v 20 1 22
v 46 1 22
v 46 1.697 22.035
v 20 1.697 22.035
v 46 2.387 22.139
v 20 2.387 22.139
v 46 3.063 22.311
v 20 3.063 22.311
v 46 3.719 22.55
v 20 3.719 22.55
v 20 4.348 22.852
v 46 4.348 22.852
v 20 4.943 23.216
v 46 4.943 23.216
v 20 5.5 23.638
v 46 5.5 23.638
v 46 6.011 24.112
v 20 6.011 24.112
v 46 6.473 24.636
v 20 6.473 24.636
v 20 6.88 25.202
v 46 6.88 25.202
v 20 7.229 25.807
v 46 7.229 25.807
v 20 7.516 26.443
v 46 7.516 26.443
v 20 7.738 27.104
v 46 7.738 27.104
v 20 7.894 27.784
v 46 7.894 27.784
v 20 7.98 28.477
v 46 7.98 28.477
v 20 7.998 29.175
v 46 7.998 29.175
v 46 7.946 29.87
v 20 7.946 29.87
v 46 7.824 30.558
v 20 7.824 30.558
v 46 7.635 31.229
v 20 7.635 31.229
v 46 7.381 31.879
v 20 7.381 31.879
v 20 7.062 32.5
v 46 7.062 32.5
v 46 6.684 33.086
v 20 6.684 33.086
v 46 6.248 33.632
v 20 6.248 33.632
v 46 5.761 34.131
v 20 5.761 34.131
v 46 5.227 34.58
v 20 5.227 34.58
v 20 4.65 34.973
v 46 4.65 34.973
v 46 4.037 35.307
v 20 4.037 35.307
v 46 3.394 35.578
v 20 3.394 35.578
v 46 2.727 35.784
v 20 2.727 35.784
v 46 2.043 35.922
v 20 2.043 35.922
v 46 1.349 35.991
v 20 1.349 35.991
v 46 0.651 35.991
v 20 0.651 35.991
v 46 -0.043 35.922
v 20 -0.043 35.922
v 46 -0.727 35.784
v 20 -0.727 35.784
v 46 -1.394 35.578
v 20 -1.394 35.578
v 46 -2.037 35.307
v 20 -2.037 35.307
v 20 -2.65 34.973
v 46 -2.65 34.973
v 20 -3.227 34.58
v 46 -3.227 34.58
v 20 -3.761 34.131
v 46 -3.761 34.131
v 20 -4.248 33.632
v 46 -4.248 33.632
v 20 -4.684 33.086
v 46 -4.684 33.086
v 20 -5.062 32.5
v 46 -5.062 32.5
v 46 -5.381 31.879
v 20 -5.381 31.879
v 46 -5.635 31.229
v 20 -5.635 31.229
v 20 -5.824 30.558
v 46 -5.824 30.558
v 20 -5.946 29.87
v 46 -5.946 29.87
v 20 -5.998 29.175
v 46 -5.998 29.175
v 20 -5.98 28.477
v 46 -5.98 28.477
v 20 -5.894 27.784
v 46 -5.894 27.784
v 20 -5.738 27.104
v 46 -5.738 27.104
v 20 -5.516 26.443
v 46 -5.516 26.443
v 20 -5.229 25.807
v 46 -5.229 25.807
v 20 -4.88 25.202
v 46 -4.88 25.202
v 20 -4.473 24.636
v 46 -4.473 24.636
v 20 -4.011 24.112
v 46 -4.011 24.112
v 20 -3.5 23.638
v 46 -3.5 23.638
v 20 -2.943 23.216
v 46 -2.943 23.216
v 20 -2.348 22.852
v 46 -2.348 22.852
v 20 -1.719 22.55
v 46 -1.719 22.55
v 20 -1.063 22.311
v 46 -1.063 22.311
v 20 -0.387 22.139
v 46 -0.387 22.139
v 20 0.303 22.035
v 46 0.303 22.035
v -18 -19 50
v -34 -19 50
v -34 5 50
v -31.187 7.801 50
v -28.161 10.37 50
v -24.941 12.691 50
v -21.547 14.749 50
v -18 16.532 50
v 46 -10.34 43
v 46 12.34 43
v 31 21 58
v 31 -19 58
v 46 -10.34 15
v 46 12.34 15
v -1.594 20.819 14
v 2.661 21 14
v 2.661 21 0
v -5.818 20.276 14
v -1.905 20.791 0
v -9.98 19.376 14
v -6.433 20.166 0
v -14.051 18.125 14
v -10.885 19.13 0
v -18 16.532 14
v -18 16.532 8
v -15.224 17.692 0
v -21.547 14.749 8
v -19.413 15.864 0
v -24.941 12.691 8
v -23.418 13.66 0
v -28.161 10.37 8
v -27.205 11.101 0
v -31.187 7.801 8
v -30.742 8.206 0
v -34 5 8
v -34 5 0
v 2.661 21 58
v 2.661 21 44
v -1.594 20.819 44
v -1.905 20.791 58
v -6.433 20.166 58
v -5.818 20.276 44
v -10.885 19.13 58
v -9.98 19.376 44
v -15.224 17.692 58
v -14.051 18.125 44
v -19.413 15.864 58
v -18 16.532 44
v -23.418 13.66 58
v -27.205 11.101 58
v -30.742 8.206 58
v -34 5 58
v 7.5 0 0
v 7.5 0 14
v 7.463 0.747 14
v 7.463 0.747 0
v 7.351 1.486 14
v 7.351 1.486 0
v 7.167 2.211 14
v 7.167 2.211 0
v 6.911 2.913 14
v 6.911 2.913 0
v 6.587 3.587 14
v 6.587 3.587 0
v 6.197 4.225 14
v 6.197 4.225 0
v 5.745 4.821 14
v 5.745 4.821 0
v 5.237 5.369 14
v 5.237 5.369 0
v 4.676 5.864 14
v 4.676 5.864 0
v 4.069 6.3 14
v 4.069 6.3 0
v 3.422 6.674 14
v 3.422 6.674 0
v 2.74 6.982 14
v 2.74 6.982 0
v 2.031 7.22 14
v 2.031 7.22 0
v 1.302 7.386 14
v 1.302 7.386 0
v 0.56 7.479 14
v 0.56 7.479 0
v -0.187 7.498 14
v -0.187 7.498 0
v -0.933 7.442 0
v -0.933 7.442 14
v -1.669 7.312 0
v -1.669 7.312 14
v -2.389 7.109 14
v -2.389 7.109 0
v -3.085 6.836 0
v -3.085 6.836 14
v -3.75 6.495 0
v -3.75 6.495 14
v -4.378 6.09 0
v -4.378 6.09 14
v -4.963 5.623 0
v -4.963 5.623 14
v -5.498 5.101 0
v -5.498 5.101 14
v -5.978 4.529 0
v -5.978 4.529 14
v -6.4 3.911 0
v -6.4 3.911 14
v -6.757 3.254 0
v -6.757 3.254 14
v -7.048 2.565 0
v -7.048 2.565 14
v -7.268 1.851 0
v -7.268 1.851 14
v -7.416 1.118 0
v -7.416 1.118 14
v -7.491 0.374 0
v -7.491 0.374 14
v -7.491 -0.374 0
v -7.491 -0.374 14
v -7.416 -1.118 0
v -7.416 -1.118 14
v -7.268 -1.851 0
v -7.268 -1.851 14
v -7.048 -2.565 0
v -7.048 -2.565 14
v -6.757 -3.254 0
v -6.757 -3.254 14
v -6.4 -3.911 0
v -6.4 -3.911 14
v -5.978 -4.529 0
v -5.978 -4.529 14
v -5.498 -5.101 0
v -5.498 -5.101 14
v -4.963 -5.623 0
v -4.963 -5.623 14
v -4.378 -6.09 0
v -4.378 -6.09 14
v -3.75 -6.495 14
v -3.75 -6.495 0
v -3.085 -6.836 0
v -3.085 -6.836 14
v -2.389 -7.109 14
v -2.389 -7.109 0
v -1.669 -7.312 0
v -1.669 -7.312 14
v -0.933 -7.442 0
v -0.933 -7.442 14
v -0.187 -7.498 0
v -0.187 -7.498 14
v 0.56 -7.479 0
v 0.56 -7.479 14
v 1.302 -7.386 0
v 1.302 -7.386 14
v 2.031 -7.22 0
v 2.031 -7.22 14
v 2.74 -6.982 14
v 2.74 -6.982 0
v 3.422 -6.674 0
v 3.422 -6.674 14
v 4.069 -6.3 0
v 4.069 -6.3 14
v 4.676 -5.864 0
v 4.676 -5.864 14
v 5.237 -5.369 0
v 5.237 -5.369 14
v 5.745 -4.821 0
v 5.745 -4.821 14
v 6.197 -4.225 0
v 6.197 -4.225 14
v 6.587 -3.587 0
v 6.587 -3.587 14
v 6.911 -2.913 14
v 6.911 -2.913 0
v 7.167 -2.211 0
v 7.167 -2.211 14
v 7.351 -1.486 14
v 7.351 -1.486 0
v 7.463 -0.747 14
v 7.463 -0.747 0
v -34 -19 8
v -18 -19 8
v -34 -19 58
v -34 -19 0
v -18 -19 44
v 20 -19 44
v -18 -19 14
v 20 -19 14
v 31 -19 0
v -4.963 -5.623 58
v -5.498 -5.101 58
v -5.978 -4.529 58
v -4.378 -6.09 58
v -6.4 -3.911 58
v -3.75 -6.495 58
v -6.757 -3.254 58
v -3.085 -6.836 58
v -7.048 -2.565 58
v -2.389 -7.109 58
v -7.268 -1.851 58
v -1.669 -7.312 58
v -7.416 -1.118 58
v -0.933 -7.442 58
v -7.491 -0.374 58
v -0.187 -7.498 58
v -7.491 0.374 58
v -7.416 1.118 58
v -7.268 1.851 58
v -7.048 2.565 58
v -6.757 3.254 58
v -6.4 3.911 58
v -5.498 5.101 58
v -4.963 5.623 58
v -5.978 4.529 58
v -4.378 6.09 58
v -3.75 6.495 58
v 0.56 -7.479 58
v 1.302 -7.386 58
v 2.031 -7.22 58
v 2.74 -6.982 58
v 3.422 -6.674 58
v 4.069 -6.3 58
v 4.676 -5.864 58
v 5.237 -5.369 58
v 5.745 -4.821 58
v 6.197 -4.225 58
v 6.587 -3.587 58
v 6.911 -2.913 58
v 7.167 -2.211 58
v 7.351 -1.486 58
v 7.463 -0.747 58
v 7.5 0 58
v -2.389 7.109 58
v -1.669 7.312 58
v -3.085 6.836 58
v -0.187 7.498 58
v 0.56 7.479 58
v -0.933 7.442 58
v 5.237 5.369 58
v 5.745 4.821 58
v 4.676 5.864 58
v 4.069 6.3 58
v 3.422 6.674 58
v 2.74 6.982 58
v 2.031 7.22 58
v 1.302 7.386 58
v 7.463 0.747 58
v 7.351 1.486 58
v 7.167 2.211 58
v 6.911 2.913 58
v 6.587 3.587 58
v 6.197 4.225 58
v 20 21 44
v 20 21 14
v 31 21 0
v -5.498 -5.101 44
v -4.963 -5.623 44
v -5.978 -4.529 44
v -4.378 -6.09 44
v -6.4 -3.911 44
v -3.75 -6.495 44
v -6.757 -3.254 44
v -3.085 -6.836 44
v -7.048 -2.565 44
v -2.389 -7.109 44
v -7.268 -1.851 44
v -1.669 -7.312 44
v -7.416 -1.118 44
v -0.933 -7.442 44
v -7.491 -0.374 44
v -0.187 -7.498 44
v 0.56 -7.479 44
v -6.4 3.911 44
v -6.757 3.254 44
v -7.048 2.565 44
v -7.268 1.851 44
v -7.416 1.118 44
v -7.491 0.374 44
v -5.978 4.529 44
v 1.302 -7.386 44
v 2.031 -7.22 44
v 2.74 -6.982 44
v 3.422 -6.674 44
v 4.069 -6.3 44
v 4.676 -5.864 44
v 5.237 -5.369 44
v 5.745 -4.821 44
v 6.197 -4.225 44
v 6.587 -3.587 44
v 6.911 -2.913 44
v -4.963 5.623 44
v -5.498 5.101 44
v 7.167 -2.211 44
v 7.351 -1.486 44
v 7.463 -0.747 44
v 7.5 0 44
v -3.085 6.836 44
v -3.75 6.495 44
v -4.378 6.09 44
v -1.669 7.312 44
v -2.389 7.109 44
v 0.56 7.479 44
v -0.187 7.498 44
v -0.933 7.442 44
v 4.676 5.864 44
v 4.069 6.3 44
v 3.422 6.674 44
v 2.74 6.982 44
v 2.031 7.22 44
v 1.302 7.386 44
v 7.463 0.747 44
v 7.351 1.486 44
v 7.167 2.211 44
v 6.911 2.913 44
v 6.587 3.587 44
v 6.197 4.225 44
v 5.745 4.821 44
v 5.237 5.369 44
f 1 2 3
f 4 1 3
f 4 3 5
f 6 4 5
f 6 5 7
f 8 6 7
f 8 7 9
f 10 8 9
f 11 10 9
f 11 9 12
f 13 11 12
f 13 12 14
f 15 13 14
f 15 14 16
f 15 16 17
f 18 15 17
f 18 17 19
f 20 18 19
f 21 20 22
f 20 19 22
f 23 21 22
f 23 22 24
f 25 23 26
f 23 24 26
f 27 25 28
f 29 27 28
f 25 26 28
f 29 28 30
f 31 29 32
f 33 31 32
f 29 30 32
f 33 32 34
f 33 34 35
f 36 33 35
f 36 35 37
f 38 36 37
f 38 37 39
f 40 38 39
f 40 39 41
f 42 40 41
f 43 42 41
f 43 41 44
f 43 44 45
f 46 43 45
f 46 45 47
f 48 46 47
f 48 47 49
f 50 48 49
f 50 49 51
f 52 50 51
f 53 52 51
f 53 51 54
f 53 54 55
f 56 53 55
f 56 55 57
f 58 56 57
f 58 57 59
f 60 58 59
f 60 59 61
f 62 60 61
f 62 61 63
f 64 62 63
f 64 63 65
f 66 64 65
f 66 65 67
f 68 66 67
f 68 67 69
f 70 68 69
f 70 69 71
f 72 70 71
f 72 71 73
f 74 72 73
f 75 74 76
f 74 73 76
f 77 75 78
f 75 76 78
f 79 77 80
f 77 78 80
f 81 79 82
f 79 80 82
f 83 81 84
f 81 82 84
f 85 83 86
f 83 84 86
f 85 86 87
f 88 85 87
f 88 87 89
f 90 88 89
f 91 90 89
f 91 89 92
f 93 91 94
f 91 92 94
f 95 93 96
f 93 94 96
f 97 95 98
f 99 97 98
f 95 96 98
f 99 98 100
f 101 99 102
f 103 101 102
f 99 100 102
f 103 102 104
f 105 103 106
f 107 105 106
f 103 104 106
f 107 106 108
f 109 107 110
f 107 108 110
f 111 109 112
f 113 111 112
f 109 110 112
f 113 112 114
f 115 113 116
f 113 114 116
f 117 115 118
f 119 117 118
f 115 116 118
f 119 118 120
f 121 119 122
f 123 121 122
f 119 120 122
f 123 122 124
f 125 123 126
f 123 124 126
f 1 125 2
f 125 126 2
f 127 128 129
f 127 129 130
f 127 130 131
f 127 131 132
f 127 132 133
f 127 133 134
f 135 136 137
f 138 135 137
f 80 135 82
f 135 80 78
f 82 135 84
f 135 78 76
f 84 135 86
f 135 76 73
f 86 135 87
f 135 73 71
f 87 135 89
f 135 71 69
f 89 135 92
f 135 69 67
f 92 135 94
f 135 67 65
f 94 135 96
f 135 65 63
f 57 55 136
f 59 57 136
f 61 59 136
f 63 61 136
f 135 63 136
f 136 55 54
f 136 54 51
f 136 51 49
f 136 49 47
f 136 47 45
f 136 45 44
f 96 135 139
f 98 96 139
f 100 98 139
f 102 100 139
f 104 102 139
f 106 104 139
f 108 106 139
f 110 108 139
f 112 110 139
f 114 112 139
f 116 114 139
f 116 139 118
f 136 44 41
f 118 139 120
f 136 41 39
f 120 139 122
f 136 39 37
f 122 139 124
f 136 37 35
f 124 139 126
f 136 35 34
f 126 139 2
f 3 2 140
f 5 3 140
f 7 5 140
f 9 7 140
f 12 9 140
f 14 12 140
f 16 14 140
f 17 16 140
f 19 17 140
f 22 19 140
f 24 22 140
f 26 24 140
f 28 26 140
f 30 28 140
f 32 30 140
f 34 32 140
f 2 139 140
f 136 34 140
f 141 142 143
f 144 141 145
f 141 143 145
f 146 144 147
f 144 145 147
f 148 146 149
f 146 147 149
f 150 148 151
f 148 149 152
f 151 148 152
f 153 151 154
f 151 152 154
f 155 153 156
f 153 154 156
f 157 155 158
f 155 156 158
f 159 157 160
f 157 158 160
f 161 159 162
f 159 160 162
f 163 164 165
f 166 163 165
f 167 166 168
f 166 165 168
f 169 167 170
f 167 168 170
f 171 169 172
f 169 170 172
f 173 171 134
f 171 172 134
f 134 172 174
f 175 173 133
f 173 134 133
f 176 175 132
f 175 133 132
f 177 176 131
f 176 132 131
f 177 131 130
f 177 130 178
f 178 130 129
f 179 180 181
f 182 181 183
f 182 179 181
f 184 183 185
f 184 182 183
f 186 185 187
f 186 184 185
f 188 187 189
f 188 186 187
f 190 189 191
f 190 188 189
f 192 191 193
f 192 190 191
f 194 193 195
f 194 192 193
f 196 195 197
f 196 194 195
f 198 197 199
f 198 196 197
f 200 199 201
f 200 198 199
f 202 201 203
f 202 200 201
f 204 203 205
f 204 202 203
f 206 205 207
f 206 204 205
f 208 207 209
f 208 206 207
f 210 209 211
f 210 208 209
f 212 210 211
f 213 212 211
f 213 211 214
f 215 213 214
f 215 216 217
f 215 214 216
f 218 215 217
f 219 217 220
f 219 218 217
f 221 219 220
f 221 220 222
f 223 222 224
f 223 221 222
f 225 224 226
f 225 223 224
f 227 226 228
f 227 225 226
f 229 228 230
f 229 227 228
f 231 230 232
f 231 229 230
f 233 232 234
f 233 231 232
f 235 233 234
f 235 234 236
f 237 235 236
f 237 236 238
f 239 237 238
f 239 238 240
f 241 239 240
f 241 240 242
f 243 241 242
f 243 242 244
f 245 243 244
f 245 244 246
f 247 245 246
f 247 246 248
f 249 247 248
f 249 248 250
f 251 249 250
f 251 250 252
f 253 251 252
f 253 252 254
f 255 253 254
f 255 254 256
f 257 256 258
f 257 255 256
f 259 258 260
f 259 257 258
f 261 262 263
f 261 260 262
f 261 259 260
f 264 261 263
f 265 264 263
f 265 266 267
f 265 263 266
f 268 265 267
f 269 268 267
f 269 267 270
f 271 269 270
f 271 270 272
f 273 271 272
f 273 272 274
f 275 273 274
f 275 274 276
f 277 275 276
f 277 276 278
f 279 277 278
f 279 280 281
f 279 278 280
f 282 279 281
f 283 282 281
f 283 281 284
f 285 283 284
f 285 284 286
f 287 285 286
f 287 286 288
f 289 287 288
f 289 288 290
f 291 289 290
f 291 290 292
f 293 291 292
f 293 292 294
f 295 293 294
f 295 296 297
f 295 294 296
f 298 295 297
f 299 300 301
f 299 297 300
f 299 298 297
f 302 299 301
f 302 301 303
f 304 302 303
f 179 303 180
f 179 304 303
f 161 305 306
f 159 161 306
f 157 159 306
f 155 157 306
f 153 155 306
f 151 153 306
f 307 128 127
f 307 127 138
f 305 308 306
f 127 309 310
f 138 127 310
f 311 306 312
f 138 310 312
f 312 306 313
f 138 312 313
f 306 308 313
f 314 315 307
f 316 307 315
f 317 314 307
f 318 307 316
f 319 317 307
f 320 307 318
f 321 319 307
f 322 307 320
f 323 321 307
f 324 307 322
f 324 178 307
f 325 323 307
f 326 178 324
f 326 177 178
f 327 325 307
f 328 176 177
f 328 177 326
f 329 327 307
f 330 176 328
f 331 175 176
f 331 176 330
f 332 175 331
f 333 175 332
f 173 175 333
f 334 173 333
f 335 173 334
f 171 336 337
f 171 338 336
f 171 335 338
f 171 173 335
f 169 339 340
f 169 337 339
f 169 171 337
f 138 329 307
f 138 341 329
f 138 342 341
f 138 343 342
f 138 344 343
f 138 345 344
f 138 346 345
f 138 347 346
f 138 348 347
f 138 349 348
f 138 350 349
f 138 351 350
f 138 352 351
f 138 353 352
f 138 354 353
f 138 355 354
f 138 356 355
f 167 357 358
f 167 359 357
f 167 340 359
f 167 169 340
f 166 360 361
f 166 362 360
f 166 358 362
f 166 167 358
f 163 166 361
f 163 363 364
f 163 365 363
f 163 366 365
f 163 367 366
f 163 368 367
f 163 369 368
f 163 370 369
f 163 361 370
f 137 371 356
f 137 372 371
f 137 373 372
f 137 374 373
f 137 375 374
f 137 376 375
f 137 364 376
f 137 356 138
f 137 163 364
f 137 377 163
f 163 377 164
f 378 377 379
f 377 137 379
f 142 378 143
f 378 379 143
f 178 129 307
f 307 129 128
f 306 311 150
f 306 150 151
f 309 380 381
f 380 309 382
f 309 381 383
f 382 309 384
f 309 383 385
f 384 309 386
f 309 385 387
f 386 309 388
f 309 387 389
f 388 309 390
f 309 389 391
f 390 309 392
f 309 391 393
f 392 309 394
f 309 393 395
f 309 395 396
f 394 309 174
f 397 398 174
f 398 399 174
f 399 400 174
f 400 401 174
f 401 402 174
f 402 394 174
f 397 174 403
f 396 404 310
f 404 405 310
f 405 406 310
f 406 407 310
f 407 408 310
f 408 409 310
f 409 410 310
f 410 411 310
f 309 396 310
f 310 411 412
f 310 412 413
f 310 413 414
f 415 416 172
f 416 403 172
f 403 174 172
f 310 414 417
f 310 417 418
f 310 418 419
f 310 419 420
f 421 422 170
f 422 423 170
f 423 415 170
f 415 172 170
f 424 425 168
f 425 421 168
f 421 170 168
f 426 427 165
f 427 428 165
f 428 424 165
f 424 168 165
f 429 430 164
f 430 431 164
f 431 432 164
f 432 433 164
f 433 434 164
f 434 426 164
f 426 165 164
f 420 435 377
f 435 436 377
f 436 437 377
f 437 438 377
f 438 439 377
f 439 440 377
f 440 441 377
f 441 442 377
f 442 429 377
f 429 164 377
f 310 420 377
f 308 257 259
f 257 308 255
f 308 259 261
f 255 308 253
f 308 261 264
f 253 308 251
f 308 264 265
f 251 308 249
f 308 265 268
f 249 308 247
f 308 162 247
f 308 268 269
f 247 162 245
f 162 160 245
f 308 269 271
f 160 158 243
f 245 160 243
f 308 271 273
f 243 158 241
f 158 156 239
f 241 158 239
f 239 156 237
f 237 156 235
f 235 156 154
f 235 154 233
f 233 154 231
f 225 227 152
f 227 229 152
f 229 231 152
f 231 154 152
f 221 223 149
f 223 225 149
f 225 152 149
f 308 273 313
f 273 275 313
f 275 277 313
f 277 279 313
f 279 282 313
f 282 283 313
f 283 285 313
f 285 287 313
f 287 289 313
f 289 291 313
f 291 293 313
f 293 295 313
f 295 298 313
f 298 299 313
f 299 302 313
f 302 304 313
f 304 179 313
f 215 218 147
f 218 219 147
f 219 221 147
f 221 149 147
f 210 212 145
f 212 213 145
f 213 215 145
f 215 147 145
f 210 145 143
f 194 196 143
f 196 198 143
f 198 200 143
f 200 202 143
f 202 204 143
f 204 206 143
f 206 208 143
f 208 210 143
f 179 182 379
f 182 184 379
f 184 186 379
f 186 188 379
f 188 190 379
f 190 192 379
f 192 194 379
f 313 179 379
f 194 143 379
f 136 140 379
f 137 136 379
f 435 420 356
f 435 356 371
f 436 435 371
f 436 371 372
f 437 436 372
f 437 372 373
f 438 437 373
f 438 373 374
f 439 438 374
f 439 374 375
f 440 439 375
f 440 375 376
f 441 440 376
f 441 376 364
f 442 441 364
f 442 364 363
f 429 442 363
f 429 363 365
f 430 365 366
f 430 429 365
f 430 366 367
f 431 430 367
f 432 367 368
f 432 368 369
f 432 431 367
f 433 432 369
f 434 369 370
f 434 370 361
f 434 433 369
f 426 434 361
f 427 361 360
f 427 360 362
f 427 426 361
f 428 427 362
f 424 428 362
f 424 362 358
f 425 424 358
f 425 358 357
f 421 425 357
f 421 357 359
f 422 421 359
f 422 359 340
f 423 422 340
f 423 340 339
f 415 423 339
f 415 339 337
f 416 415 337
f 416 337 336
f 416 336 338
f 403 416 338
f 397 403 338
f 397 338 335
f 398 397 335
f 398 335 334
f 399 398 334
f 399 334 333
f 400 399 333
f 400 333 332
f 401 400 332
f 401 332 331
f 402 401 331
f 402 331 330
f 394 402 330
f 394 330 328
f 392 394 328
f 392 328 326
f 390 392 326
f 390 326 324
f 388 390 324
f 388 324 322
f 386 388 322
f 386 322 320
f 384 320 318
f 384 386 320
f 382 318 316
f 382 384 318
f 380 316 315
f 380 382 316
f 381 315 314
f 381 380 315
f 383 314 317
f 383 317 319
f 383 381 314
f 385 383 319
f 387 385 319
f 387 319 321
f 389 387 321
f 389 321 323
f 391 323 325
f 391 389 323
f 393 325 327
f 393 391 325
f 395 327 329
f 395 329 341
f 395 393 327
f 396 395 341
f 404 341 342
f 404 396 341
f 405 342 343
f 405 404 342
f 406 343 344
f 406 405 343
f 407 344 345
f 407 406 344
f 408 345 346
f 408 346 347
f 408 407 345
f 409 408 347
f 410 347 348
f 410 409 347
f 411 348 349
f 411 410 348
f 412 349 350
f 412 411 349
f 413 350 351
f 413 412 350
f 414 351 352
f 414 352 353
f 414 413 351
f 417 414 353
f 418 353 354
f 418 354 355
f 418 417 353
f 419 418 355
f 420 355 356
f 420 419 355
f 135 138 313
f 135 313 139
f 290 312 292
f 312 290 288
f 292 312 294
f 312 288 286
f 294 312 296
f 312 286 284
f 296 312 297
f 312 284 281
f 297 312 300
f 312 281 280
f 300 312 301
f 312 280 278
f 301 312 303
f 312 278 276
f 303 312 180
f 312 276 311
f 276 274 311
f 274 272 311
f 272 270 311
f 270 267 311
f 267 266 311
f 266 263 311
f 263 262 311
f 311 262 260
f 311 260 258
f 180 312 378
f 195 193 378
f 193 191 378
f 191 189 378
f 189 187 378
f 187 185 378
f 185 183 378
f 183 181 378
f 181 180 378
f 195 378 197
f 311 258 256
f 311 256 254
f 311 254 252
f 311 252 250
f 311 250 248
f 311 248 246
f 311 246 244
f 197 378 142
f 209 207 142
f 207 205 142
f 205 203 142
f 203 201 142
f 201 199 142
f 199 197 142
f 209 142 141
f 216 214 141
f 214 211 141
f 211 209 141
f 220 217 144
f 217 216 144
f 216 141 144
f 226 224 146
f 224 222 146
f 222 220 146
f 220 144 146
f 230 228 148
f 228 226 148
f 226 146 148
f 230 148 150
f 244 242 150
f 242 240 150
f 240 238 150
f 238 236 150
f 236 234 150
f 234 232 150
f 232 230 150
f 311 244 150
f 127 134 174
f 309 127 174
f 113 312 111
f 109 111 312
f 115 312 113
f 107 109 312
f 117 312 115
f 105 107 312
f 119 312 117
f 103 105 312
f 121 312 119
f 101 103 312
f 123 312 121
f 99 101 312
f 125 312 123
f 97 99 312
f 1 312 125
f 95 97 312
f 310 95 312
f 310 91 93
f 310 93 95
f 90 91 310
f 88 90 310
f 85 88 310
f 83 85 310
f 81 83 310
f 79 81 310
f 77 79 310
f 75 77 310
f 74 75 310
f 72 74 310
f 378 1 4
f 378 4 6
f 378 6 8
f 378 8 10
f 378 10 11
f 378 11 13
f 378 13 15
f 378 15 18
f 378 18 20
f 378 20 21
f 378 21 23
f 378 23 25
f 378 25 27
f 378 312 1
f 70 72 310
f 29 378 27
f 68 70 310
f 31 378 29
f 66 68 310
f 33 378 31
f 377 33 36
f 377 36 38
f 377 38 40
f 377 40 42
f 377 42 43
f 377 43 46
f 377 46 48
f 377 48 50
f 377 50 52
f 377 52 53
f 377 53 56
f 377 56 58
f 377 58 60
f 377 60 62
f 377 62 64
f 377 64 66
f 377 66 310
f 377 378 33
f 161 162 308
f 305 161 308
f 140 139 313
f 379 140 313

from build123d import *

# Parameters (mm, degrees)
SKETCH1_R                = 7.5
BOSS_EXTRUDE1_DEPTH      = 58
SKETCH5_R                = 7
CUT_EXTRUDE1_DEPTH       = 81
CUT_EXTRUDE3_DEPTH       = 22.0000001
CUT_EXTRUDE3_DEPTH_BACK  = 20
SKETCH7_W                = 16
SKETCH7_H                = 6
CUT_EXTRUDE5_DEPTH       = 22
CUT_EXTRUDE5_DEPTH_BACK  = 20
CUT_EXTRUDE14_DEPTH      = 24
CUT_EXTRUDE14_DEPTH_BACK = 24


with BuildPart() as part:
    # Sketch1 → Boss-Extrude1 (new body)
    with BuildSketch(Plane.XY):
        with BuildLine():
            Line((-34, -19), (31, -19))
            Line((31, -19), (46, -10.339745962))
            Line((46, -10.339745962), (46, 12.339745962))
            Line((46, 12.339745962), (31, 21))
            Line((31, 21), (2.66060556, 21))
            ThreePointArc((2.66060556, 21), (-17.33939444, 16.82575695), (-34, 5))
            Line((-34, 5), (-34, -19))
        make_face()
        Circle(SKETCH1_R, mode=Mode.SUBTRACT)
    extrude(amount=BOSS_EXTRUDE1_DEPTH)

    # Sketch5 → Cut-Extrude1 (cut, through all)
    with BuildSketch(Plane(origin=(46, 0, 0), x_dir=(0, 0, -1), z_dir=(1, 0, 0))):
        with Locations((-29, 1)):
            Circle(SKETCH5_R)
    extrude(amount=-CUT_EXTRUDE1_DEPTH, mode=Mode.SUBTRACT)

    # Sketch6 → Cut-Extrude3 (cut, two sides)
    with BuildSketch(Plane(origin=(0, 0, 0), x_dir=(1, 0, 0), z_dir=(0, 1, 0))) as cut_extrude3_sk:
        Polygon((-226.60339564, -14), (-34, -14), (20, -14), (20, -44), (-34, -44), (-226.60339564, -44), (-611.81018692, -44), (-611.81018692, -14), align=None)
    extrude(amount=CUT_EXTRUDE3_DEPTH, mode=Mode.SUBTRACT)
    extrude(cut_extrude3_sk.sketch, amount=-CUT_EXTRUDE3_DEPTH_BACK, mode=Mode.SUBTRACT)

    # Sketch7 → Cut-Extrude5 (cut, two sides)
    with BuildSketch(Plane(origin=(0, 0, 0), x_dir=(1, 0, 0), z_dir=(0, 1, 0))) as cut_extrude5_sk:
        with Locations((-26, -11)):
            Rectangle(SKETCH7_W, SKETCH7_H)
        with Locations((-26, -47)):
            Rectangle(SKETCH7_W, SKETCH7_H)
    extrude(amount=CUT_EXTRUDE5_DEPTH, mode=Mode.SUBTRACT)
    extrude(cut_extrude5_sk.sketch, amount=-CUT_EXTRUDE5_DEPTH_BACK, mode=Mode.SUBTRACT)

    # Sketch14 → Cut-Extrude14 (cut, two sides)
    with BuildSketch(Plane(origin=(0, 0, 0), x_dir=(1, 0, 0), z_dir=(0, 1, 0))) as cut_extrude14_sk:
        Polygon((31, 0), (46, 0), (46, -15), align=None)
        Polygon((31, -58), (46, -58), (46, -43), align=None)
    extrude(amount=CUT_EXTRUDE14_DEPTH, mode=Mode.SUBTRACT)
    extrude(cut_extrude14_sk.sketch, amount=-CUT_EXTRUDE14_DEPTH_BACK, mode=Mode.SUBTRACT)


solid = part.part
